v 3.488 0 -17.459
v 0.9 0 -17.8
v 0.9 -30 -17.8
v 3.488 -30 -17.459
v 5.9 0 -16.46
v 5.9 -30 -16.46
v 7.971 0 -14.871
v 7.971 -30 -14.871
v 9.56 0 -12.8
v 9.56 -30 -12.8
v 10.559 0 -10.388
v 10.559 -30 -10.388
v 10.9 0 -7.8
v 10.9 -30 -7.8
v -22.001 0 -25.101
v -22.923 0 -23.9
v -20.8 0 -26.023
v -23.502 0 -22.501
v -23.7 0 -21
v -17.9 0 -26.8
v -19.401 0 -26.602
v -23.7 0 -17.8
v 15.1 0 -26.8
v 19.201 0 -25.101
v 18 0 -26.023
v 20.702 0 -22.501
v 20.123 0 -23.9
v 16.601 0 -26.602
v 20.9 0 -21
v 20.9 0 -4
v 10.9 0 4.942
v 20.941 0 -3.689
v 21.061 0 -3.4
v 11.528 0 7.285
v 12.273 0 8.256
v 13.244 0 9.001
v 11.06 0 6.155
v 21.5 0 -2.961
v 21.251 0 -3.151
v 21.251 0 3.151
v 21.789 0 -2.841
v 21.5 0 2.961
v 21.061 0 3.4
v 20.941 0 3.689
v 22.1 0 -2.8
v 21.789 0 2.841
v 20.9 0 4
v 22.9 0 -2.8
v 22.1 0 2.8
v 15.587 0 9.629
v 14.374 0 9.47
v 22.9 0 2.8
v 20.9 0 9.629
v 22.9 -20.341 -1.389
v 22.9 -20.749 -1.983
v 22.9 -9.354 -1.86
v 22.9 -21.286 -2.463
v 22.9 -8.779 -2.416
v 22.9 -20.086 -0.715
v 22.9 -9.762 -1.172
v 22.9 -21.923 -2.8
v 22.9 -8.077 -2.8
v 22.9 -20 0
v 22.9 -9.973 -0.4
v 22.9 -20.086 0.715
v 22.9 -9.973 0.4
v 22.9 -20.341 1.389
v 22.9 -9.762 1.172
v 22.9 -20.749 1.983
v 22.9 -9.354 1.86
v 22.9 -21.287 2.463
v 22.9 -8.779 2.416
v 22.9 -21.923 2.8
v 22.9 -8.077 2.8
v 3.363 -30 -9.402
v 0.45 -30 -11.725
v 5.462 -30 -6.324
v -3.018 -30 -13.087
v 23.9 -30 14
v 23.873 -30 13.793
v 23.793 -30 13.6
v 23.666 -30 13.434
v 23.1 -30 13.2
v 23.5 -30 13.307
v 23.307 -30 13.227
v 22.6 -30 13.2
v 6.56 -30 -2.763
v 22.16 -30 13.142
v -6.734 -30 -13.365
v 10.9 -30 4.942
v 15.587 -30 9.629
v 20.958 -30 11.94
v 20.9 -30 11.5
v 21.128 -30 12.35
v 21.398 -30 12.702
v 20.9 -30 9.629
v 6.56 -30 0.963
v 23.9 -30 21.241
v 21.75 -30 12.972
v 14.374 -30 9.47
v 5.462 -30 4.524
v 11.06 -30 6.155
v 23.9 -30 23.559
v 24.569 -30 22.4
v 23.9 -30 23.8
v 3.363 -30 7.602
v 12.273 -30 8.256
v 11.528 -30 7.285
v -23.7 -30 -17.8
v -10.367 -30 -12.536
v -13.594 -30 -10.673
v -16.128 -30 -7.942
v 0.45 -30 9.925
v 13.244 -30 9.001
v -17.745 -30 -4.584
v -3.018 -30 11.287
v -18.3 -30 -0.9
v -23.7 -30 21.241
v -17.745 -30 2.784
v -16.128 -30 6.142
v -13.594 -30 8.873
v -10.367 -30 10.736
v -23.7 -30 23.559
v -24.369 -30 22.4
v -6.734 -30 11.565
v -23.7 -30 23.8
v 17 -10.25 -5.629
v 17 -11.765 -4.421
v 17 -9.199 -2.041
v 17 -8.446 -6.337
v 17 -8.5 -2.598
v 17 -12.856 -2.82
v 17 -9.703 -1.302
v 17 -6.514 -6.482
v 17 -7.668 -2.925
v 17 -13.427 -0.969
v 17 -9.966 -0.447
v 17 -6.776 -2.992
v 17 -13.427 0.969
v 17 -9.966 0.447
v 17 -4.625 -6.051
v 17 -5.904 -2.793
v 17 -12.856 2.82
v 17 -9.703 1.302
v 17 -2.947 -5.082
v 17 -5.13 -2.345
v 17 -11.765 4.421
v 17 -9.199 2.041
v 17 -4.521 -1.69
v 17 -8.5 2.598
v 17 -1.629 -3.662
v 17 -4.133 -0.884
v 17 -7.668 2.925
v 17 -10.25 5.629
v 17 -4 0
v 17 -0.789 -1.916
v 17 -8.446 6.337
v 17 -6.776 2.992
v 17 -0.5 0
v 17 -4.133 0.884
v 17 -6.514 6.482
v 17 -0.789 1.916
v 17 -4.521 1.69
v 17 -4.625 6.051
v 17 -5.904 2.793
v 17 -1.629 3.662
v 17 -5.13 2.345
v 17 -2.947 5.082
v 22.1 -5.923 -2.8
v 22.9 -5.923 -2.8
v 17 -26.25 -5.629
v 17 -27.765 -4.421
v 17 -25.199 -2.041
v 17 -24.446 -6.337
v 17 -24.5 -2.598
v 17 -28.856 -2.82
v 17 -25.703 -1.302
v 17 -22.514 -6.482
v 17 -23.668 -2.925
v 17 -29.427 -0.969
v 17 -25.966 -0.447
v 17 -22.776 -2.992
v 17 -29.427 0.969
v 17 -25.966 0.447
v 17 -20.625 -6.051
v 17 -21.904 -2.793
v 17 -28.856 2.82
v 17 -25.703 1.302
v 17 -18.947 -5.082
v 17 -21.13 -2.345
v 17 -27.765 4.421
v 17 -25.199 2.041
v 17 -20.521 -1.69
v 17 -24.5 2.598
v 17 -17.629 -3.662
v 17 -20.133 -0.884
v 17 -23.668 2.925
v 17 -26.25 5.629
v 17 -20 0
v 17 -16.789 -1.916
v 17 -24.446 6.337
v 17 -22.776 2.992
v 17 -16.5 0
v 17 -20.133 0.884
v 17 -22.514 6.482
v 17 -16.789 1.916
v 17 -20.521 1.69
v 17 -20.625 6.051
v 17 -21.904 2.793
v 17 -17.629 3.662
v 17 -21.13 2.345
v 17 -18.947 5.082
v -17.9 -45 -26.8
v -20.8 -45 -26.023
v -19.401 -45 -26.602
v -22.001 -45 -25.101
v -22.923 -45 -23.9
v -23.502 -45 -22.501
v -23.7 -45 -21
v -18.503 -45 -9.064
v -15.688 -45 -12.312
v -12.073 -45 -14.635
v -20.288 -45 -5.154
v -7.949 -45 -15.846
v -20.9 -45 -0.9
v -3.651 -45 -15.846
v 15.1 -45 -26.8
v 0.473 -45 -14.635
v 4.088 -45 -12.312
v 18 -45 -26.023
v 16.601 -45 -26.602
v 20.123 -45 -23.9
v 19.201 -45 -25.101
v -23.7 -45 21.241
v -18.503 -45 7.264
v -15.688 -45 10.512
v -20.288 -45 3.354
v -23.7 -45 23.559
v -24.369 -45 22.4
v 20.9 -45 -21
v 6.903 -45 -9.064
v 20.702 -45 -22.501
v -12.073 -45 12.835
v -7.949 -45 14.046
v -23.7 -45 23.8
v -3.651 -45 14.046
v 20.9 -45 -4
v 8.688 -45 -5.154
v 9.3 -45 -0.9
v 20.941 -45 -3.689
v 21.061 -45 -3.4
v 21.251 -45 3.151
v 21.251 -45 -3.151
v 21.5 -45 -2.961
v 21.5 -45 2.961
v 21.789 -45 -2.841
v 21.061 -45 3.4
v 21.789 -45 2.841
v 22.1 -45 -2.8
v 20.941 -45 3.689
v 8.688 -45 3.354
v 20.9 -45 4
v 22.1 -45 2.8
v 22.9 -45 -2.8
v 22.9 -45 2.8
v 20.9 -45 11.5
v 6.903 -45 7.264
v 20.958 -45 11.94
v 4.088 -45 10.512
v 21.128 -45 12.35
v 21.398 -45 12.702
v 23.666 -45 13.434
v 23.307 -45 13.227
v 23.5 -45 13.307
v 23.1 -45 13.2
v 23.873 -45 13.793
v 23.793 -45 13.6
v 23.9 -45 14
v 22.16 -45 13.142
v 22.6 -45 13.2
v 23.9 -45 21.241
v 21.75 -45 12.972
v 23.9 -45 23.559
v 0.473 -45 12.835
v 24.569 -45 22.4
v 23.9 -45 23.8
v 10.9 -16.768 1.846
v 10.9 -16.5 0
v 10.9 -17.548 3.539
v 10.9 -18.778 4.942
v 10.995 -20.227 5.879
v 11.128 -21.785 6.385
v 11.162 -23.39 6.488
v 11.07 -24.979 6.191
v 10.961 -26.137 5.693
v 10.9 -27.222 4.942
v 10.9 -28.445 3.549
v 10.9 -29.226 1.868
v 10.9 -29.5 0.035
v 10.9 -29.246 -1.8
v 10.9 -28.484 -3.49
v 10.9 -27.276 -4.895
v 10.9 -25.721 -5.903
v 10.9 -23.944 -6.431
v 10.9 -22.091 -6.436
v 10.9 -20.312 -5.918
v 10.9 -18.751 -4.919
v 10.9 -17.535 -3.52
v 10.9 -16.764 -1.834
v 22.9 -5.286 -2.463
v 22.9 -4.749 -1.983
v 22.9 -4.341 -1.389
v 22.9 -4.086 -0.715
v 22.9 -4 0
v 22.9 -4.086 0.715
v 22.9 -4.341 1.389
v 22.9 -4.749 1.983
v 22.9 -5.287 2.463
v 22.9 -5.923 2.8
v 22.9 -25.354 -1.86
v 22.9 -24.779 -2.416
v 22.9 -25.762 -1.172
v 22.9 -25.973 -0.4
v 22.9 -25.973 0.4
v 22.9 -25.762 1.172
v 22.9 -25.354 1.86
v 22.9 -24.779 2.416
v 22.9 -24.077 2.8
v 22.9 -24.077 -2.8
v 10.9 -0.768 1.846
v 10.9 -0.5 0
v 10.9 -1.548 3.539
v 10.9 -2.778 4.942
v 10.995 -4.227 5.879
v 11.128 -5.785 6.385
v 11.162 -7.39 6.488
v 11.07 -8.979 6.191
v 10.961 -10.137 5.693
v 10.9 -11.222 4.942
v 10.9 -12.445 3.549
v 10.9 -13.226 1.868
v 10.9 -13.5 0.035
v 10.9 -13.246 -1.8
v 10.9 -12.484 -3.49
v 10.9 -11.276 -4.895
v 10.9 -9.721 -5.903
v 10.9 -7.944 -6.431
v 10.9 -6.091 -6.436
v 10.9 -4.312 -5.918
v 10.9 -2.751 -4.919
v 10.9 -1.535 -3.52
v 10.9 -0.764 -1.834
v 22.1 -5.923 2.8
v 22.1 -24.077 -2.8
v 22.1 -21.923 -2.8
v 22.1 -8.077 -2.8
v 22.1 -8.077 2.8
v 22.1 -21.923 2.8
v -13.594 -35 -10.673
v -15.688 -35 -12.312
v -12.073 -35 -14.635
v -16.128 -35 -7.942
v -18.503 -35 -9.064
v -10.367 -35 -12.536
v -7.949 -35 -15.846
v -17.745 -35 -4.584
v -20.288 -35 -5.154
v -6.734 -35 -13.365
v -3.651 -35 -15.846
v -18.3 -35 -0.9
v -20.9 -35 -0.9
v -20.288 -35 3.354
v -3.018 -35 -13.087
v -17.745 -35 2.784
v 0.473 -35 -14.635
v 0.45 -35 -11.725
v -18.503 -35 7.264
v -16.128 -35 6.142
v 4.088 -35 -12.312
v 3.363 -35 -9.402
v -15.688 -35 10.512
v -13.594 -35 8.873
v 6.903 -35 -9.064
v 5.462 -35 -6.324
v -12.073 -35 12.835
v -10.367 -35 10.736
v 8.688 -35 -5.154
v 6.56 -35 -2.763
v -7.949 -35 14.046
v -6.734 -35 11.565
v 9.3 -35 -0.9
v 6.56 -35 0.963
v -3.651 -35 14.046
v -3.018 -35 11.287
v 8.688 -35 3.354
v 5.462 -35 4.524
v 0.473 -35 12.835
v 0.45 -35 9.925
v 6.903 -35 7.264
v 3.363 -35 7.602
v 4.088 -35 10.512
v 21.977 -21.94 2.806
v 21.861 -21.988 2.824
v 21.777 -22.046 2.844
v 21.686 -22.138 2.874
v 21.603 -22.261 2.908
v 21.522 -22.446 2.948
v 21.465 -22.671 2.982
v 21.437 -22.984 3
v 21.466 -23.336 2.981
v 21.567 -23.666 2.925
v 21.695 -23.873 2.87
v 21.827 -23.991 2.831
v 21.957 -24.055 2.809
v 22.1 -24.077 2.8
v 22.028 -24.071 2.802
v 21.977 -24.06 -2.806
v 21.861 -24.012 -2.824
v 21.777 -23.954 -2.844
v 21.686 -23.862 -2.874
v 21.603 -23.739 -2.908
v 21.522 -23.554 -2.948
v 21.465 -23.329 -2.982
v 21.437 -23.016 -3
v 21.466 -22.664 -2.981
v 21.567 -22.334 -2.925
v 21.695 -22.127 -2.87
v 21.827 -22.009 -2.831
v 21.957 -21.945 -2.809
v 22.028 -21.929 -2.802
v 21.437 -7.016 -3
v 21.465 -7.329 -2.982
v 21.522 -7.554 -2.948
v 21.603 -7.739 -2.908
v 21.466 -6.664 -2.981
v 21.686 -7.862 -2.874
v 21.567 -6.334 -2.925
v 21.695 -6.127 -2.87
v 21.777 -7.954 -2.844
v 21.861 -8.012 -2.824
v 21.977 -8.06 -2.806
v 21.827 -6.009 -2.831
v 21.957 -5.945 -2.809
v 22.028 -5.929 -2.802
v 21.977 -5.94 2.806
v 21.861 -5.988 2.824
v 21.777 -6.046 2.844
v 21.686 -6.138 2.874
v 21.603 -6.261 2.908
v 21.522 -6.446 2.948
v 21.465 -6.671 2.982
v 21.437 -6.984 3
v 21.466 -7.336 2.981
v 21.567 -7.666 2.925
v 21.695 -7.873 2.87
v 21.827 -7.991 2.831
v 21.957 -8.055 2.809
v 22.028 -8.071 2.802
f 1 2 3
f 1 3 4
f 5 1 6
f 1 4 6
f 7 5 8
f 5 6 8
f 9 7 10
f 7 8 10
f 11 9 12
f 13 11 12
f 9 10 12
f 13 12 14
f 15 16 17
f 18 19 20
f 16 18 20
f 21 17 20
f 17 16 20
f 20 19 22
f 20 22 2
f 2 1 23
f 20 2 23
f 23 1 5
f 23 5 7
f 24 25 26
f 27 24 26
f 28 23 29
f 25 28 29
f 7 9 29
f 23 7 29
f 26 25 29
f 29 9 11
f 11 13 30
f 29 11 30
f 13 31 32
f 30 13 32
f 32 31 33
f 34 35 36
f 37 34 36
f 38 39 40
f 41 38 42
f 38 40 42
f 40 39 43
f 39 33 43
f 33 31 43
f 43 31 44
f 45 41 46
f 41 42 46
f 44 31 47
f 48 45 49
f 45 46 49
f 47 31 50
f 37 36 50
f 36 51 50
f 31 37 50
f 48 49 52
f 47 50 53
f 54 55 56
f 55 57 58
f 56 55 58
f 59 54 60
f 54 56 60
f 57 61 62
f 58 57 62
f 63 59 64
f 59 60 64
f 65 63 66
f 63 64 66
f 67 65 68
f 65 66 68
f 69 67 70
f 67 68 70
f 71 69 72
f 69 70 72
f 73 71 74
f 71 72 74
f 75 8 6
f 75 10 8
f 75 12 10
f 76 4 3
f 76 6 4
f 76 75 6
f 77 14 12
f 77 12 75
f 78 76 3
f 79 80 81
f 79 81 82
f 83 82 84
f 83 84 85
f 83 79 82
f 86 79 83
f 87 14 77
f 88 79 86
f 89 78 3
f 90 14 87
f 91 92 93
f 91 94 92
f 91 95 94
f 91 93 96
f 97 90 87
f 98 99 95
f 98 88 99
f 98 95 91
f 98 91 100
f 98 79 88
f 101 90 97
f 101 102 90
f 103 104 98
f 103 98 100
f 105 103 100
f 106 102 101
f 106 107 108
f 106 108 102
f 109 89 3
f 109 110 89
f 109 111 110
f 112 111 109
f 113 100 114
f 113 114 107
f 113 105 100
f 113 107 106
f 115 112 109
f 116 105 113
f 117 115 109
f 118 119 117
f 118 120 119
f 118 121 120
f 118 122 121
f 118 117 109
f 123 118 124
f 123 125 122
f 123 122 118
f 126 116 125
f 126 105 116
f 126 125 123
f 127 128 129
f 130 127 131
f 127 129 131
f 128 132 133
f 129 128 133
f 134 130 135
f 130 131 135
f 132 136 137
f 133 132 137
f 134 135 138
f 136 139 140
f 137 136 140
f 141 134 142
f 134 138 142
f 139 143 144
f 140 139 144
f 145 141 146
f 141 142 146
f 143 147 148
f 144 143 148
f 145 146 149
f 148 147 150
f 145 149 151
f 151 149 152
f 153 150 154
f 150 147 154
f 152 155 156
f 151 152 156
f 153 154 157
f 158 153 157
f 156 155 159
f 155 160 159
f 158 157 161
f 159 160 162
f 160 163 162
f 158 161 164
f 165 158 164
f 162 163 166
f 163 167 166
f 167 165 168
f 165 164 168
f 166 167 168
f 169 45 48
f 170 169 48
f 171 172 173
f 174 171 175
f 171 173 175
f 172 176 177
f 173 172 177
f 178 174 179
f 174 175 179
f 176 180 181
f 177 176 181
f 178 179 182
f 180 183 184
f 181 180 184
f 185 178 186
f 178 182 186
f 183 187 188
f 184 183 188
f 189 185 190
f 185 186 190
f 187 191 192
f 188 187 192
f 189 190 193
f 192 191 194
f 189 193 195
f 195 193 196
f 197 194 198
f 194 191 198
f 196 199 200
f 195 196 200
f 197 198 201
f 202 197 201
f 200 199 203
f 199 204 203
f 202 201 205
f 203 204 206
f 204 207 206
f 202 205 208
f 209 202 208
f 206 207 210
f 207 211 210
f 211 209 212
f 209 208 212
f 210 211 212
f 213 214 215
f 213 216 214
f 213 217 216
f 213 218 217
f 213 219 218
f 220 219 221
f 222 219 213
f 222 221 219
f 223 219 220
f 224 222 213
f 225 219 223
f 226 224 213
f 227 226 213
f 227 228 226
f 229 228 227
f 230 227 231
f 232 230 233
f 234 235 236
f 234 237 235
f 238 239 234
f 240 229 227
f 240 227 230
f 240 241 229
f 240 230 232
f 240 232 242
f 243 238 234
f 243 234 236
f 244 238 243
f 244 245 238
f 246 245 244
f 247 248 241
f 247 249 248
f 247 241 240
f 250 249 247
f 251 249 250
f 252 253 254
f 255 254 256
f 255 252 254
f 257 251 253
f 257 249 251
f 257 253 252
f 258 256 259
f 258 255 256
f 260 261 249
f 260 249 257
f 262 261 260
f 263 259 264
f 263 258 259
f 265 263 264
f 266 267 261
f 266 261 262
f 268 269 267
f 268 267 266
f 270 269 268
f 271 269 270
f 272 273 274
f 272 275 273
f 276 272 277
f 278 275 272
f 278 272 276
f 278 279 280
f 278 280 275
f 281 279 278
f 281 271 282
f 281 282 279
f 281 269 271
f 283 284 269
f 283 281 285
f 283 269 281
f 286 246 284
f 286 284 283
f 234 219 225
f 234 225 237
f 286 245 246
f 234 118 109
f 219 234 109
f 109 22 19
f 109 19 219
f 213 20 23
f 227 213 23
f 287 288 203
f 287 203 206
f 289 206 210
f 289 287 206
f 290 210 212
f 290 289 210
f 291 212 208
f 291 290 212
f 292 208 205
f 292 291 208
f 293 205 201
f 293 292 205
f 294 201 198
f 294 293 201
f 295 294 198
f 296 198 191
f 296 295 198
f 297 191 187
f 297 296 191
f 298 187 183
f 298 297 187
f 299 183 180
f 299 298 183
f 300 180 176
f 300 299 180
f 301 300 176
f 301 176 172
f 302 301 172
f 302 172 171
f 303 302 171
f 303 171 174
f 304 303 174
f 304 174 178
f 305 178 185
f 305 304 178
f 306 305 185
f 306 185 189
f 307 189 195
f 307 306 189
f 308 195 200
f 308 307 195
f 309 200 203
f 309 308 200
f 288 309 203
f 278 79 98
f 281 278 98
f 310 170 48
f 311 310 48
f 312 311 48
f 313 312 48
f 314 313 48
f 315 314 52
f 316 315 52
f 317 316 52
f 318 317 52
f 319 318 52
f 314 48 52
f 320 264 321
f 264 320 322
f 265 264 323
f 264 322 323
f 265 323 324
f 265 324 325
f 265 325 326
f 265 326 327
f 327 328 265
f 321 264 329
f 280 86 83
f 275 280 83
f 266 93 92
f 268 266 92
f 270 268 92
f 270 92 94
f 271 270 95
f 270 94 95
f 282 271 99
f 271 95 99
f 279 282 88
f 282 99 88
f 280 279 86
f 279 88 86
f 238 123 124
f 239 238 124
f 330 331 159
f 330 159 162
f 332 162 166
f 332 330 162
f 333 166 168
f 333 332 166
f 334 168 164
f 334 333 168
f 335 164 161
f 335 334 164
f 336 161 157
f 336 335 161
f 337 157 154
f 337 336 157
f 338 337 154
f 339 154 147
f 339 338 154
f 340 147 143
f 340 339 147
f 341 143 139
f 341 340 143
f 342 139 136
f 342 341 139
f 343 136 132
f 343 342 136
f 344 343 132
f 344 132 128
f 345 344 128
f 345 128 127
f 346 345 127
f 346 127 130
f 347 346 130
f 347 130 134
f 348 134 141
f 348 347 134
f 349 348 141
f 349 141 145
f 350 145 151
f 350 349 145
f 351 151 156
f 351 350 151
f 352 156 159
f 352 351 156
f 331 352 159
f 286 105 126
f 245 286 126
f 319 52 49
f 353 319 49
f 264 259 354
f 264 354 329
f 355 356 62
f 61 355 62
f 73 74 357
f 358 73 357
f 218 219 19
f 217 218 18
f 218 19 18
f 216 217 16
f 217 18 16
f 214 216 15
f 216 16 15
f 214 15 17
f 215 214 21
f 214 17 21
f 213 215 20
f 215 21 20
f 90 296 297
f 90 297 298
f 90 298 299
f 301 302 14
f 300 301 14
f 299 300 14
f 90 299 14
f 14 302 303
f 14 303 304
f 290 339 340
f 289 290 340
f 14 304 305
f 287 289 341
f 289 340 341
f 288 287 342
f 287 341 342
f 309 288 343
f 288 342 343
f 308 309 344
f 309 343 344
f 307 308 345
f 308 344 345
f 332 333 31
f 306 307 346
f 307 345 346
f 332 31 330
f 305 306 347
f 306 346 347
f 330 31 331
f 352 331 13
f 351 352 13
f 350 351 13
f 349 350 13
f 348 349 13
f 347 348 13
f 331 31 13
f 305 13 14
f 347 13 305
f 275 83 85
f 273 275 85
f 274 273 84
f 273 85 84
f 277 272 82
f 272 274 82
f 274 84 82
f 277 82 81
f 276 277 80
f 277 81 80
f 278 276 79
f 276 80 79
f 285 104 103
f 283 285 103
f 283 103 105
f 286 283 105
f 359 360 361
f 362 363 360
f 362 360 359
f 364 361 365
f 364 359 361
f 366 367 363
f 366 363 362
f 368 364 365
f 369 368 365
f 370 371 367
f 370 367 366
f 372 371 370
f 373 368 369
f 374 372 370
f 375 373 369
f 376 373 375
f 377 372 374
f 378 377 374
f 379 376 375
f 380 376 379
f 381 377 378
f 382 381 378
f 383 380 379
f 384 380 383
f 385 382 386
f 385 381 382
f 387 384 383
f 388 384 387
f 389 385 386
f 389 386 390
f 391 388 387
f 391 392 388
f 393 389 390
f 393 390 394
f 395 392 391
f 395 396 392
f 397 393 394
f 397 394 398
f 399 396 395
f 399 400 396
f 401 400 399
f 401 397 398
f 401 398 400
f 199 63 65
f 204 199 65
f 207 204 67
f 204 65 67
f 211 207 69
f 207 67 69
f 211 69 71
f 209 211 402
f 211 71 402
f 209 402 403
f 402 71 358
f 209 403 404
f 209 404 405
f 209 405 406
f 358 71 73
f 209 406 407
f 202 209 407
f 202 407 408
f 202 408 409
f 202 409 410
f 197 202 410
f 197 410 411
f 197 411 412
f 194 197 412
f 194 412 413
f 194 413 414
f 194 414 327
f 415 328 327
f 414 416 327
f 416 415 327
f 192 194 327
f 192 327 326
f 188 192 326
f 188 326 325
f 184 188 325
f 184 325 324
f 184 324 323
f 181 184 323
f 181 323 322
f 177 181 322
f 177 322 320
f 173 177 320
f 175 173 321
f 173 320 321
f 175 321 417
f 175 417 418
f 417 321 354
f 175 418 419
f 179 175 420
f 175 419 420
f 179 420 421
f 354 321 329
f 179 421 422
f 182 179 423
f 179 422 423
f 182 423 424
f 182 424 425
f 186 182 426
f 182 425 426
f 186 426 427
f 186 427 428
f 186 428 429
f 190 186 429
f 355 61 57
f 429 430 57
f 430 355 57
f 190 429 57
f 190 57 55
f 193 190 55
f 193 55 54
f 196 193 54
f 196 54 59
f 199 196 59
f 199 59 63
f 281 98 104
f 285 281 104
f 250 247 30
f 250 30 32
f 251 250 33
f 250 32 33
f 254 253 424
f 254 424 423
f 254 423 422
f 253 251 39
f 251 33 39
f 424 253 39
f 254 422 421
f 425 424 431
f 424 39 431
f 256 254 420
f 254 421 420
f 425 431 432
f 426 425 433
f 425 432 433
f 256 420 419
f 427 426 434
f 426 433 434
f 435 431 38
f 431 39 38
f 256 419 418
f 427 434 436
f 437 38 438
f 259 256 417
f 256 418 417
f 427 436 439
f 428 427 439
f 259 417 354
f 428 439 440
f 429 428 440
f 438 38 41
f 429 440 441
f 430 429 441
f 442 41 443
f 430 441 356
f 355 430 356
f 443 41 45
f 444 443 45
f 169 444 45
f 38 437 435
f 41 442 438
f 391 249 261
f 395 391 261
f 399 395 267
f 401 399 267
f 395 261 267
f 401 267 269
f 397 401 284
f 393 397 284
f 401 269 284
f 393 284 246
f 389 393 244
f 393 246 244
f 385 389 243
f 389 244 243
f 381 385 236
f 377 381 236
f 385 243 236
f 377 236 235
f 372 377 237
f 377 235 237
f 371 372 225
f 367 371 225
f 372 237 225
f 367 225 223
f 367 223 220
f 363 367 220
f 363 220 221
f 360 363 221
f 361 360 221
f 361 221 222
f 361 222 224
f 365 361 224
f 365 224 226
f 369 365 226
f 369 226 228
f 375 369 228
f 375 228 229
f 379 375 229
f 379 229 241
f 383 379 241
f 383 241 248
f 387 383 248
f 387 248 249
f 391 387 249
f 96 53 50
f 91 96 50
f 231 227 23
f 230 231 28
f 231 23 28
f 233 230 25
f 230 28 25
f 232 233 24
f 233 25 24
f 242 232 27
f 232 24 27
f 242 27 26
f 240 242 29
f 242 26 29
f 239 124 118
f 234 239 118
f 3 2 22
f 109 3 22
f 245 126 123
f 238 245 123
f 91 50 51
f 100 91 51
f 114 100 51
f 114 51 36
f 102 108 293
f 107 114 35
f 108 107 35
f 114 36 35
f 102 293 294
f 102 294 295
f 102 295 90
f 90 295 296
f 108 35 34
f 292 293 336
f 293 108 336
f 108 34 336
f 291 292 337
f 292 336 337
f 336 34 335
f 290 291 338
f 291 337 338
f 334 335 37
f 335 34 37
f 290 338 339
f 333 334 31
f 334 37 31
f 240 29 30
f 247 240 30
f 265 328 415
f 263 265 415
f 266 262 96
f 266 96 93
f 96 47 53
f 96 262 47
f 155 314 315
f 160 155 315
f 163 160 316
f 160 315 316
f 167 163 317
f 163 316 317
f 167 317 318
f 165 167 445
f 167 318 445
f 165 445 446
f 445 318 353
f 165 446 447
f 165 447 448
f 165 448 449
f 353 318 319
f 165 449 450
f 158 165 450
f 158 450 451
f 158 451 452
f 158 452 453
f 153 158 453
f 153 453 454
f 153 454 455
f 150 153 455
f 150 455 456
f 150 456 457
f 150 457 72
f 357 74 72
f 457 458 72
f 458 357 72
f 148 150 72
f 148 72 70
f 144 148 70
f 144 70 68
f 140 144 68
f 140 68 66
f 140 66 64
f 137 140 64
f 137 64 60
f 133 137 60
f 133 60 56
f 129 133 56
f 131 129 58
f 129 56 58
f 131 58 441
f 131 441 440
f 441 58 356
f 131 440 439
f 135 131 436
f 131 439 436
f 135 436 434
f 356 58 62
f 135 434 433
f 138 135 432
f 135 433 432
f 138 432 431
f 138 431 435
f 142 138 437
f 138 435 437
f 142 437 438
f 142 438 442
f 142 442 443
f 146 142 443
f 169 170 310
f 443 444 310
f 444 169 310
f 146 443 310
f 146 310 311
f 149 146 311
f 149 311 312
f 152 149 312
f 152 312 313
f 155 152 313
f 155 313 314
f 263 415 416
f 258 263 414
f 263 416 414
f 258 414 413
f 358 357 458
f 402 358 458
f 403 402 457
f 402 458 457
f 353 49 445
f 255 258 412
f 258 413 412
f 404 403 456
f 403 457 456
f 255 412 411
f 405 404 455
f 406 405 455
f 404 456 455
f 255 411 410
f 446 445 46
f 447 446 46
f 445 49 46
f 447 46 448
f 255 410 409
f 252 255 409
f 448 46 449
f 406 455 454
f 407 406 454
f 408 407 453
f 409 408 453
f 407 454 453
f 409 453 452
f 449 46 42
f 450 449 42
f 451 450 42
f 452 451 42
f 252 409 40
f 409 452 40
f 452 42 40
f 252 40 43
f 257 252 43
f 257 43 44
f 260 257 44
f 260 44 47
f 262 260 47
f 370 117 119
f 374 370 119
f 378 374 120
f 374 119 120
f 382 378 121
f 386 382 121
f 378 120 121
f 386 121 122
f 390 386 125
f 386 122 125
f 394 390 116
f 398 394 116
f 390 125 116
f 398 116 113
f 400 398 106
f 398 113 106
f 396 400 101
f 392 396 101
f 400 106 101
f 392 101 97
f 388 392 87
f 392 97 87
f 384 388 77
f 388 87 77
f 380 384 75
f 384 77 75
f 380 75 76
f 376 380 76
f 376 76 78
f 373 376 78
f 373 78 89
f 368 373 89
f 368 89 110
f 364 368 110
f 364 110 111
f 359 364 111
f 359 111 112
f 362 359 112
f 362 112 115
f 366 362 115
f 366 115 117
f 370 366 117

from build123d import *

# Parameters (mm, degrees)
F1_DEPTH  = 55
F3_DEPTH  = 30
F4_R      = 3
F5_DEPTH  = 25
F6_R      = 12.5
F7_DEPTH  = 55.0010001
F8_R      = 15.1
F9_DEPTH  = 20
F10_R     = 6.5
F11_DEPTH = 17
F12_R     = 10
F13_W     = 62.573639676
F13_H     = 57.5273763388
F14_DEPTH = 10


# Not quite as in the source:
# - a feature names something its author has since deleted; it is built from what else it names


with BuildPart() as f1:
    # F0 (on Front) → F1 (new body)
    with BuildSketch(Plane.XZ):
        with BuildLine():
            Line((-23.6999987811, 23.7999986857), (-23.6999987811, 23.5588453133))
            Line((-23.6999987811, 23.5588453133), (-24.3690585991, 22.3999992996))
            Line((-24.3690585991, 22.3999992996), (-23.6999987811, 21.241153286))
            Line((-23.6999987811, 21.241153286), (-23.6999987811, -21.0000007004))
            ThreePointArc((-23.6999987811, -21.0000007004), (-22.0012182918, -25.1012195971), (-17.899999395, -26.8000000864))
            Line((-17.899999395, -26.8000000864), (15.100000605, -26.8000000864))
            ThreePointArc((15.100000605, -26.8000000864), (19.2012195018, -25.1012195971), (20.8999999911, -21.0000007004))
            Line((20.8999999911, -21.0000007004), (20.8999999911, -4.0000007004))
            ThreePointArc((20.8999999911, -4.0000007004), (21.2514720335, -3.1514721288), (22.100000605, -2.8000000864))
            Line((22.100000605, -2.8000000864), (22.8999999911, -2.8000000864))
            Line((22.8999999911, -2.8000000864), (22.8999999911, 2.7999986857))
            Line((22.8999999911, 2.7999986857), (22.100000605, 2.7999986857))
            ThreePointArc((22.100000605, 2.7999986857), (21.2514720335, 3.1514707281), (20.8999999911, 3.9999992996))
            Line((20.8999999911, 3.9999992996), (20.8999999911, 11.4999992996))
            ThreePointArc((20.8999999911, 11.4999992996), (21.3979186429, 12.7020812618), (22.600000605, 13.1999999136))
            Line((22.600000605, 13.1999999136), (23.100000605, 13.1999999136))
            ThreePointArc((23.100000605, 13.1999999136), (23.6656855958, 13.4343143088), (23.8999999911, 13.9999992996))
            Line((23.8999999911, 13.9999992996), (23.8999999911, 21.241153286))
            Line((23.8999999911, 21.241153286), (24.5690598091, 22.3999992996))
            Line((24.5690598091, 22.3999992996), (23.8999999911, 23.5588453133))
            Line((23.8999999911, 23.5588453133), (23.8999999911, 23.7999986857))
            Line((23.8999999911, 23.7999986857), (-23.6999987811, 23.7999986857))
        make_face()
    extrude(amount=F1_DEPTH)

    # F2 (on face) → F3 (cut)
    with BuildSketch(Plane(origin=(0, 0, 0), x_dir=(-1, 0, 0), z_dir=(0, 1, 0))):
        with BuildLine():
            Line((-9.7267732358, -17.8000000864), (27.0197465134, -17.8000000864))
            Line((27.0197465134, -17.8000000864), (27.0197465134, 29.101931586))
            Line((27.0197465134, 29.101931586), (-25.6962114531, 29.101931586))
            Line((-25.6962114531, 29.101931586), (-25.6962114531, 9.6292318066))
            Line((-25.6962114531, 9.6292318066), (-15.5874993246, 9.6292318066))
            ThreePointArc((-15.5874993246, 9.6292318066), (-12.272936759, 8.2562950386), (-10.8999999911, 4.9417324731))
            Line((-10.8999999911, 4.9417324731), (-10.8999999911, -12.1750008862))
            Line((-10.8999999911, -12.1750008862), (-10.8999999911, -17.8000000864))
            Line((-10.8999999911, -17.8000000864), (-9.7267732358, -17.8000000864))
        make_face()
    extrude(amount=-F3_DEPTH, mode=Mode.SUBTRACT)

    # F4 (on face) → F5 (cut)
    with BuildSketch(Plane.YZ.offset(22.8999999911)):
        with Locations((-7, -1.3143e-06)):
            Circle(F4_R)
        with Locations((-23, -1.3143e-06)):
            Circle(F4_R)
    extrude(amount=-F5_DEPTH, mode=Mode.SUBTRACT)

    # F6 (on face) → F7 (cut, through all)
    with BuildSketch(Plane(origin=(0, 0, 0), x_dir=(-1, 0, 0), z_dir=(0, 1, 0))):
        with Locations((5.7999987811, -0.9000000864)):
            Circle(F6_R)
    extrude(amount=-F7_DEPTH, mode=Mode.SUBTRACT)

    # F8 (on face) → F9 (cut)
    with BuildSketch(Plane.XZ.offset(55)):
        with Locations((-5.7999987811, -0.9000000864)):
            Circle(F8_R)
    extrude(amount=-F9_DEPTH, mode=Mode.SUBTRACT)

    # F10 (on Right) → F11 (cut)
    with BuildSketch(Plane.YZ):
        with Locations((-23, 0)):
            Circle(F10_R)
        with Locations((-7, 0)):
            Circle(F10_R)
    extrude(amount=F11_DEPTH, mode=Mode.SUBTRACT)

    # F12
    f12_edges = [f1.edges().sort_by_distance(p)[0] for p in [
        (10.9, -15, -17.8),
    ]]
    fillet(f12_edges, radius=F12_R)

    # F13 (on face) → F14 (cut)
    with BuildSketch(Plane.XZ.offset(55)):
        with Locations((1.9923495129, 0.0138776377)):
            Rectangle(F13_W, F13_H)
    extrude(amount=-F14_DEPTH, mode=Mode.SUBTRACT)


solid = f1.part
